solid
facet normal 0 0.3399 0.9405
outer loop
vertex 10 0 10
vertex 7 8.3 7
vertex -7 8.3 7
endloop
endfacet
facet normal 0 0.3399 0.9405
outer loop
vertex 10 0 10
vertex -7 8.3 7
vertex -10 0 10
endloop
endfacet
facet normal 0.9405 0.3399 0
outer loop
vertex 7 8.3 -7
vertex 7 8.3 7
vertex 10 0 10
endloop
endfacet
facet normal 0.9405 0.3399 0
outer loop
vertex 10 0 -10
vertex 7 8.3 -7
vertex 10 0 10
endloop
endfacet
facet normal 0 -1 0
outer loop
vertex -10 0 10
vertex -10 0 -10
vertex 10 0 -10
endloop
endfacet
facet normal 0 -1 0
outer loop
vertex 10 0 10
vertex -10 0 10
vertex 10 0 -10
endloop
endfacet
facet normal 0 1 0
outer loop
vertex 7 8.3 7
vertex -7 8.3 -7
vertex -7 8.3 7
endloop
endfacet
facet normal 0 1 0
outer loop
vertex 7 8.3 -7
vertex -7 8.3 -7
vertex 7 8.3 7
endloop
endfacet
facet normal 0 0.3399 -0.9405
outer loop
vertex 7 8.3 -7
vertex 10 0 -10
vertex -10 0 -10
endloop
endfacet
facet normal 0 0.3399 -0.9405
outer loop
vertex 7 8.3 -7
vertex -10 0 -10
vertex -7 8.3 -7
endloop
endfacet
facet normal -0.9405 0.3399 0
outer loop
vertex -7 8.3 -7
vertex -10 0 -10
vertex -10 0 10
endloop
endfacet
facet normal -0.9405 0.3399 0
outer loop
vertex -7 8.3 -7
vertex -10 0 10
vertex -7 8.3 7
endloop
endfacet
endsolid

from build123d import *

# Parameters (mm, degrees)
SKETCH_1_W               = 20
SKETCH_1_H               = 20
EXTRUDE_1_DEPTH          = 8.3
SKETCH_2_OUTSIDE_W       = 27.896
SKETCH_2_OUTSIDE_H       = 16.196
CUT_EXTRUDE_1_DEPTH      = 24.851415052
CUT_EXTRUDE_2_DEPTH      = 17.397865715
CUT_EXTRUDE_2_DEPTH_BACK = 17.397865715
SKETCH_3_OUTSIDE_W       = 27.896
SKETCH_3_OUTSIDE_H       = 16.196


with BuildPart() as part:
    # 草图1 → 凸台-拉伸1 (new body)
    with BuildSketch(Plane(origin=(0, 0, 0), x_dir=(1, 0, 0), z_dir=(0, 1, 0))):
        Rectangle(SKETCH_1_W, SKETCH_1_H)
    extrude(amount=EXTRUDE_1_DEPTH)

    # 草图2 outside → 切除-拉伸1 (cut, through all)
    with BuildSketch(Plane.XY.offset(10)):
        with Locations((0, 4.15)):
            Rectangle(SKETCH_2_OUTSIDE_W, SKETCH_2_OUTSIDE_H)
        Polygon((-10, 0), (-7, 8.3), (7, 8.3), (10, 0), align=None, mode=Mode.SUBTRACT)
    extrude(amount=-CUT_EXTRUDE_1_DEPTH, mode=Mode.SUBTRACT)

    # 草图3 outside → 切除-拉伸2 (cut, two sides: drawn at the far end of the back side and taken through both)
    with BuildSketch(Plane(origin=(0, 0, 0), x_dir=(0, 0, -1), z_dir=(1, 0, 0)).offset(-CUT_EXTRUDE_2_DEPTH_BACK)):
        with Locations((0, 4.15)):
            Rectangle(SKETCH_3_OUTSIDE_W, SKETCH_3_OUTSIDE_H)
        Polygon((-10, 0), (10, 0), (7, 8.3), (-7, 8.3), align=None, mode=Mode.SUBTRACT)
    extrude(amount=CUT_EXTRUDE_2_DEPTH + CUT_EXTRUDE_2_DEPTH_BACK, mode=Mode.SUBTRACT)


solid = part.part
